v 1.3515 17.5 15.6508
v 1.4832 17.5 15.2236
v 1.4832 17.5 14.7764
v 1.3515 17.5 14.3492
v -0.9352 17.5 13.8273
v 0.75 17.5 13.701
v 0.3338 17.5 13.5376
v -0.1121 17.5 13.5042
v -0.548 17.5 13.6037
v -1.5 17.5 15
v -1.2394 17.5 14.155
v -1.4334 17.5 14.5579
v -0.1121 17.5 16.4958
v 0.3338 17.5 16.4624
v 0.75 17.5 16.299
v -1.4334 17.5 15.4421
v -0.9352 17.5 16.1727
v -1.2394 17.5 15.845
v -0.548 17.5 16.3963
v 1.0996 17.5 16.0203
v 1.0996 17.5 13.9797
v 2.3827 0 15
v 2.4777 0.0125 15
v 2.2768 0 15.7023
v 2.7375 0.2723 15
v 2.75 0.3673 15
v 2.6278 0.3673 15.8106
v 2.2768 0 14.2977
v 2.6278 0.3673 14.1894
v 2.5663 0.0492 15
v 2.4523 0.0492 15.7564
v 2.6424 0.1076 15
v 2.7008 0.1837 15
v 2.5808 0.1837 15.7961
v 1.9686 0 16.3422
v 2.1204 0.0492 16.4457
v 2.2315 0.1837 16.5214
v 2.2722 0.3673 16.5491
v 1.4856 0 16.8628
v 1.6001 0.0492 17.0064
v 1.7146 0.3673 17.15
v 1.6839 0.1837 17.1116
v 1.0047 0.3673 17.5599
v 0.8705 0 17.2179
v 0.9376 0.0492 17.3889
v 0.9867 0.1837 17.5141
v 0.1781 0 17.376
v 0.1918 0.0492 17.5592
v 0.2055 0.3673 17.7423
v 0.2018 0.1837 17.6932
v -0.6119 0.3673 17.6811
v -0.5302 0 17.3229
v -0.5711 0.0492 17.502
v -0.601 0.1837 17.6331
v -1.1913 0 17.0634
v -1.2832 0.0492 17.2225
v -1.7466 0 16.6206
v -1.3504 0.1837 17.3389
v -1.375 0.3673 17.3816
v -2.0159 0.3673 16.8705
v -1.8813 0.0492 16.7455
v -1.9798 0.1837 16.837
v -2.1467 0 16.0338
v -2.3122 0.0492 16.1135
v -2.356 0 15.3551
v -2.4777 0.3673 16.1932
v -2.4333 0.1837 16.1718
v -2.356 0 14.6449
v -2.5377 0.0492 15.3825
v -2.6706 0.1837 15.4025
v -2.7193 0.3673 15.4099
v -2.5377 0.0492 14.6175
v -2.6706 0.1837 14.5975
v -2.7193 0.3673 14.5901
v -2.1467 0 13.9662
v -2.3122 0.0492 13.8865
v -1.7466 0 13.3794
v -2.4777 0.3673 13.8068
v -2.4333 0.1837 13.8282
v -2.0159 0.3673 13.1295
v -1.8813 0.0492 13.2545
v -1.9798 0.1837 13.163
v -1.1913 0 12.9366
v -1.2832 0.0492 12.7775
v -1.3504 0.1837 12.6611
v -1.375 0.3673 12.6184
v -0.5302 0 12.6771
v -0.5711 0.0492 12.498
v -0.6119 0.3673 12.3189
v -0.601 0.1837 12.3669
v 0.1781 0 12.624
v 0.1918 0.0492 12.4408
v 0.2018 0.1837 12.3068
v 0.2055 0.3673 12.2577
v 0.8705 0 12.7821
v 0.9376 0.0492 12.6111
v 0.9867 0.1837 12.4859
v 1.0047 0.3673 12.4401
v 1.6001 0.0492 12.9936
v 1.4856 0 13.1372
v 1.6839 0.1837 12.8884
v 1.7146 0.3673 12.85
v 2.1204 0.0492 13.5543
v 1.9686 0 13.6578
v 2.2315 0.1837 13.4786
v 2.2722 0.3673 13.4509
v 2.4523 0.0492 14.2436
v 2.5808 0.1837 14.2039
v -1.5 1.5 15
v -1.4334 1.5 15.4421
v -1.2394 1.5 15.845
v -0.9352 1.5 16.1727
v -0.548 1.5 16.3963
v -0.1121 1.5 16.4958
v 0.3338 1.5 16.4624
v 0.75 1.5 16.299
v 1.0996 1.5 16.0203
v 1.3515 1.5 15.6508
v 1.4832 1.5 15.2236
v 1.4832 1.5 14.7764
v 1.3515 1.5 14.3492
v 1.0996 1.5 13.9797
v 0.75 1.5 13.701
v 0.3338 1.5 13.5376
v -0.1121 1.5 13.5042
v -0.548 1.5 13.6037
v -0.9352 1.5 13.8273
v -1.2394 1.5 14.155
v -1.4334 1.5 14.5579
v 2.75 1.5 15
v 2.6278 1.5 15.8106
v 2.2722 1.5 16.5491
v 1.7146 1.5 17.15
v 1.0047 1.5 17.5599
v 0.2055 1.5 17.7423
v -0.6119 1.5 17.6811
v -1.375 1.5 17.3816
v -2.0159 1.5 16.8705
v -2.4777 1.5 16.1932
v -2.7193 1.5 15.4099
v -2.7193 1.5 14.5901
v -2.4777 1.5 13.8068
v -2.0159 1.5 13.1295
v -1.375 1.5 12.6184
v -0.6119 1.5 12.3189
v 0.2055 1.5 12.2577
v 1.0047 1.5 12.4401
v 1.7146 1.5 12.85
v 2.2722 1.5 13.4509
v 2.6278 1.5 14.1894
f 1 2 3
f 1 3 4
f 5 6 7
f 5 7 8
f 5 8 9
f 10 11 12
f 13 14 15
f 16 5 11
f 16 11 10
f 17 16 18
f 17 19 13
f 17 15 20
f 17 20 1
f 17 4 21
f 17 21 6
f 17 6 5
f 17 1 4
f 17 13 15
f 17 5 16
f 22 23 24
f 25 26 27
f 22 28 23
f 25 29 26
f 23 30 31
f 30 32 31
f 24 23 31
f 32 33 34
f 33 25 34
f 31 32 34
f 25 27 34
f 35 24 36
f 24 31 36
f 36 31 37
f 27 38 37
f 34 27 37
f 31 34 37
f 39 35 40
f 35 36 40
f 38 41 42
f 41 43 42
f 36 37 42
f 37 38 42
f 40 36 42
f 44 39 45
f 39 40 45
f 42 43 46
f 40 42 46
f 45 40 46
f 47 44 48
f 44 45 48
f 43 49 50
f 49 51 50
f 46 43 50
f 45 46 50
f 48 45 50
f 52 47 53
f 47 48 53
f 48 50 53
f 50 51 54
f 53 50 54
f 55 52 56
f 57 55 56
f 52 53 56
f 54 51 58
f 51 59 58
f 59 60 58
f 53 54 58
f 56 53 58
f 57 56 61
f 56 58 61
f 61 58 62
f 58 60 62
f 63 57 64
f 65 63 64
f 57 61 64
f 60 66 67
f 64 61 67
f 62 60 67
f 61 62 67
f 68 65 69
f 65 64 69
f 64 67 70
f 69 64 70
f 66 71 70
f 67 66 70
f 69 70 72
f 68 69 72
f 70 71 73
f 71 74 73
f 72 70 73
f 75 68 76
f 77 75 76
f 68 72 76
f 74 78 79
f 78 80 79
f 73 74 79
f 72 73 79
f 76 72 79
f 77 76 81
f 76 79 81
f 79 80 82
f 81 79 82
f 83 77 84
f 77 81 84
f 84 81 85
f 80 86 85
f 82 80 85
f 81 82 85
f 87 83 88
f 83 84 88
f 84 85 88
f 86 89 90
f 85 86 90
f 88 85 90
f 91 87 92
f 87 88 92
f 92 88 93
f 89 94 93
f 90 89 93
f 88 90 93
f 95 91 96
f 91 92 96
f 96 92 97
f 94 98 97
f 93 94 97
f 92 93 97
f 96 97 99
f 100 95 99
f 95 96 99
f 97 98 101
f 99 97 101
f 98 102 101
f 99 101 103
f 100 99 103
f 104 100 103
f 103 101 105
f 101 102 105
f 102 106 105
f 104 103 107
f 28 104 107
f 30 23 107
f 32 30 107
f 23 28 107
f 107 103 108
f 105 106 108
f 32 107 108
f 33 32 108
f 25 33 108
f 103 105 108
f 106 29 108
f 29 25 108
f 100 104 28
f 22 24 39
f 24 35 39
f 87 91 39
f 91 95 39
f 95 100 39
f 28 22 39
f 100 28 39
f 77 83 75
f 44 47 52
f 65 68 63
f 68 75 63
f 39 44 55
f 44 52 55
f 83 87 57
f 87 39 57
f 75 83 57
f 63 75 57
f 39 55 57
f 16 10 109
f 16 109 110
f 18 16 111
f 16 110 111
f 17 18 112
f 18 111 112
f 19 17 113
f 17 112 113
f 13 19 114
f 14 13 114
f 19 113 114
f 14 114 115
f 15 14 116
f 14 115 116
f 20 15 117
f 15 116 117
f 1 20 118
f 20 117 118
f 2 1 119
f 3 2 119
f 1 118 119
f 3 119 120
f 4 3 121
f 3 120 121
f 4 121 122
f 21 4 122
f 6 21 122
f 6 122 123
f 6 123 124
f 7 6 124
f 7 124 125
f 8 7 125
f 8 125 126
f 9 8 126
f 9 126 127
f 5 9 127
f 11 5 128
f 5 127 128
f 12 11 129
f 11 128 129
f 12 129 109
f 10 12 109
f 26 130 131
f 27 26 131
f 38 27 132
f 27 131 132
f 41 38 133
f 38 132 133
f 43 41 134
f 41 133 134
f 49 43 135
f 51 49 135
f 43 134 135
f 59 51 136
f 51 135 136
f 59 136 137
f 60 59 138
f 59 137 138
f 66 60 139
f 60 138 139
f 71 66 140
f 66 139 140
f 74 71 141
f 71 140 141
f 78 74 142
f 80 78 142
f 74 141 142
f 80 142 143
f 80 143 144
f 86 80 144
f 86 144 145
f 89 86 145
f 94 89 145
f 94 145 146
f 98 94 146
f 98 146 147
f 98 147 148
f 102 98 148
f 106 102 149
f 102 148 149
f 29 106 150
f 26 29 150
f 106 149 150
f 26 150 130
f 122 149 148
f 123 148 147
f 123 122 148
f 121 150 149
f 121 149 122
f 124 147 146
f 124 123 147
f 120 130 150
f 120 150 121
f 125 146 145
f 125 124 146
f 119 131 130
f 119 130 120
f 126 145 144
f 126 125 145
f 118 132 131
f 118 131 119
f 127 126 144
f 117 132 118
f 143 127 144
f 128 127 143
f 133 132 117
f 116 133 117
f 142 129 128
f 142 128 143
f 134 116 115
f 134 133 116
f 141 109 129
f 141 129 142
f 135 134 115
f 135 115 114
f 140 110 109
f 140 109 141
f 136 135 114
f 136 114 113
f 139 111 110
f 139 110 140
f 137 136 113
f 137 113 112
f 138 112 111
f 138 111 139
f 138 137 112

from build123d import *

# Parameters (mm, degrees)
SKETCH_1_W      = 2.75
SKETCH_1_H      = 1.5
SKETCH_2_R      = 1.5
EXTRUDE_1_DEPTH = 16
FILLET_1_R      = 0.367346939


with BuildPart() as part:
    # 草图1 → 旋转1 (revolve)
    with BuildSketch(Plane.XY.offset(15)):
        with Locations((1.375, 0.75)):
            Rectangle(SKETCH_1_W, SKETCH_1_H)
    revolve(axis=Axis((0, 1.5, 15), (0, -1, 0)))

    # 草图2 → 凸台-拉伸1 (add)
    with BuildSketch(Plane(origin=(0, 1.5, 0), x_dir=(-1, 0, 0), z_dir=(0, 1, 0))):
        with Locations((0, 15)):
            Circle(SKETCH_2_R)
    extrude(amount=EXTRUDE_1_DEPTH)

    # 圆角1
    fillet_1_edges = [part.edges().sort_by_distance(p)[0] for p in [
        (-2.75, 0, 15),
    ]]
    fillet(fillet_1_edges, radius=FILLET_1_R)


solid = part.part
